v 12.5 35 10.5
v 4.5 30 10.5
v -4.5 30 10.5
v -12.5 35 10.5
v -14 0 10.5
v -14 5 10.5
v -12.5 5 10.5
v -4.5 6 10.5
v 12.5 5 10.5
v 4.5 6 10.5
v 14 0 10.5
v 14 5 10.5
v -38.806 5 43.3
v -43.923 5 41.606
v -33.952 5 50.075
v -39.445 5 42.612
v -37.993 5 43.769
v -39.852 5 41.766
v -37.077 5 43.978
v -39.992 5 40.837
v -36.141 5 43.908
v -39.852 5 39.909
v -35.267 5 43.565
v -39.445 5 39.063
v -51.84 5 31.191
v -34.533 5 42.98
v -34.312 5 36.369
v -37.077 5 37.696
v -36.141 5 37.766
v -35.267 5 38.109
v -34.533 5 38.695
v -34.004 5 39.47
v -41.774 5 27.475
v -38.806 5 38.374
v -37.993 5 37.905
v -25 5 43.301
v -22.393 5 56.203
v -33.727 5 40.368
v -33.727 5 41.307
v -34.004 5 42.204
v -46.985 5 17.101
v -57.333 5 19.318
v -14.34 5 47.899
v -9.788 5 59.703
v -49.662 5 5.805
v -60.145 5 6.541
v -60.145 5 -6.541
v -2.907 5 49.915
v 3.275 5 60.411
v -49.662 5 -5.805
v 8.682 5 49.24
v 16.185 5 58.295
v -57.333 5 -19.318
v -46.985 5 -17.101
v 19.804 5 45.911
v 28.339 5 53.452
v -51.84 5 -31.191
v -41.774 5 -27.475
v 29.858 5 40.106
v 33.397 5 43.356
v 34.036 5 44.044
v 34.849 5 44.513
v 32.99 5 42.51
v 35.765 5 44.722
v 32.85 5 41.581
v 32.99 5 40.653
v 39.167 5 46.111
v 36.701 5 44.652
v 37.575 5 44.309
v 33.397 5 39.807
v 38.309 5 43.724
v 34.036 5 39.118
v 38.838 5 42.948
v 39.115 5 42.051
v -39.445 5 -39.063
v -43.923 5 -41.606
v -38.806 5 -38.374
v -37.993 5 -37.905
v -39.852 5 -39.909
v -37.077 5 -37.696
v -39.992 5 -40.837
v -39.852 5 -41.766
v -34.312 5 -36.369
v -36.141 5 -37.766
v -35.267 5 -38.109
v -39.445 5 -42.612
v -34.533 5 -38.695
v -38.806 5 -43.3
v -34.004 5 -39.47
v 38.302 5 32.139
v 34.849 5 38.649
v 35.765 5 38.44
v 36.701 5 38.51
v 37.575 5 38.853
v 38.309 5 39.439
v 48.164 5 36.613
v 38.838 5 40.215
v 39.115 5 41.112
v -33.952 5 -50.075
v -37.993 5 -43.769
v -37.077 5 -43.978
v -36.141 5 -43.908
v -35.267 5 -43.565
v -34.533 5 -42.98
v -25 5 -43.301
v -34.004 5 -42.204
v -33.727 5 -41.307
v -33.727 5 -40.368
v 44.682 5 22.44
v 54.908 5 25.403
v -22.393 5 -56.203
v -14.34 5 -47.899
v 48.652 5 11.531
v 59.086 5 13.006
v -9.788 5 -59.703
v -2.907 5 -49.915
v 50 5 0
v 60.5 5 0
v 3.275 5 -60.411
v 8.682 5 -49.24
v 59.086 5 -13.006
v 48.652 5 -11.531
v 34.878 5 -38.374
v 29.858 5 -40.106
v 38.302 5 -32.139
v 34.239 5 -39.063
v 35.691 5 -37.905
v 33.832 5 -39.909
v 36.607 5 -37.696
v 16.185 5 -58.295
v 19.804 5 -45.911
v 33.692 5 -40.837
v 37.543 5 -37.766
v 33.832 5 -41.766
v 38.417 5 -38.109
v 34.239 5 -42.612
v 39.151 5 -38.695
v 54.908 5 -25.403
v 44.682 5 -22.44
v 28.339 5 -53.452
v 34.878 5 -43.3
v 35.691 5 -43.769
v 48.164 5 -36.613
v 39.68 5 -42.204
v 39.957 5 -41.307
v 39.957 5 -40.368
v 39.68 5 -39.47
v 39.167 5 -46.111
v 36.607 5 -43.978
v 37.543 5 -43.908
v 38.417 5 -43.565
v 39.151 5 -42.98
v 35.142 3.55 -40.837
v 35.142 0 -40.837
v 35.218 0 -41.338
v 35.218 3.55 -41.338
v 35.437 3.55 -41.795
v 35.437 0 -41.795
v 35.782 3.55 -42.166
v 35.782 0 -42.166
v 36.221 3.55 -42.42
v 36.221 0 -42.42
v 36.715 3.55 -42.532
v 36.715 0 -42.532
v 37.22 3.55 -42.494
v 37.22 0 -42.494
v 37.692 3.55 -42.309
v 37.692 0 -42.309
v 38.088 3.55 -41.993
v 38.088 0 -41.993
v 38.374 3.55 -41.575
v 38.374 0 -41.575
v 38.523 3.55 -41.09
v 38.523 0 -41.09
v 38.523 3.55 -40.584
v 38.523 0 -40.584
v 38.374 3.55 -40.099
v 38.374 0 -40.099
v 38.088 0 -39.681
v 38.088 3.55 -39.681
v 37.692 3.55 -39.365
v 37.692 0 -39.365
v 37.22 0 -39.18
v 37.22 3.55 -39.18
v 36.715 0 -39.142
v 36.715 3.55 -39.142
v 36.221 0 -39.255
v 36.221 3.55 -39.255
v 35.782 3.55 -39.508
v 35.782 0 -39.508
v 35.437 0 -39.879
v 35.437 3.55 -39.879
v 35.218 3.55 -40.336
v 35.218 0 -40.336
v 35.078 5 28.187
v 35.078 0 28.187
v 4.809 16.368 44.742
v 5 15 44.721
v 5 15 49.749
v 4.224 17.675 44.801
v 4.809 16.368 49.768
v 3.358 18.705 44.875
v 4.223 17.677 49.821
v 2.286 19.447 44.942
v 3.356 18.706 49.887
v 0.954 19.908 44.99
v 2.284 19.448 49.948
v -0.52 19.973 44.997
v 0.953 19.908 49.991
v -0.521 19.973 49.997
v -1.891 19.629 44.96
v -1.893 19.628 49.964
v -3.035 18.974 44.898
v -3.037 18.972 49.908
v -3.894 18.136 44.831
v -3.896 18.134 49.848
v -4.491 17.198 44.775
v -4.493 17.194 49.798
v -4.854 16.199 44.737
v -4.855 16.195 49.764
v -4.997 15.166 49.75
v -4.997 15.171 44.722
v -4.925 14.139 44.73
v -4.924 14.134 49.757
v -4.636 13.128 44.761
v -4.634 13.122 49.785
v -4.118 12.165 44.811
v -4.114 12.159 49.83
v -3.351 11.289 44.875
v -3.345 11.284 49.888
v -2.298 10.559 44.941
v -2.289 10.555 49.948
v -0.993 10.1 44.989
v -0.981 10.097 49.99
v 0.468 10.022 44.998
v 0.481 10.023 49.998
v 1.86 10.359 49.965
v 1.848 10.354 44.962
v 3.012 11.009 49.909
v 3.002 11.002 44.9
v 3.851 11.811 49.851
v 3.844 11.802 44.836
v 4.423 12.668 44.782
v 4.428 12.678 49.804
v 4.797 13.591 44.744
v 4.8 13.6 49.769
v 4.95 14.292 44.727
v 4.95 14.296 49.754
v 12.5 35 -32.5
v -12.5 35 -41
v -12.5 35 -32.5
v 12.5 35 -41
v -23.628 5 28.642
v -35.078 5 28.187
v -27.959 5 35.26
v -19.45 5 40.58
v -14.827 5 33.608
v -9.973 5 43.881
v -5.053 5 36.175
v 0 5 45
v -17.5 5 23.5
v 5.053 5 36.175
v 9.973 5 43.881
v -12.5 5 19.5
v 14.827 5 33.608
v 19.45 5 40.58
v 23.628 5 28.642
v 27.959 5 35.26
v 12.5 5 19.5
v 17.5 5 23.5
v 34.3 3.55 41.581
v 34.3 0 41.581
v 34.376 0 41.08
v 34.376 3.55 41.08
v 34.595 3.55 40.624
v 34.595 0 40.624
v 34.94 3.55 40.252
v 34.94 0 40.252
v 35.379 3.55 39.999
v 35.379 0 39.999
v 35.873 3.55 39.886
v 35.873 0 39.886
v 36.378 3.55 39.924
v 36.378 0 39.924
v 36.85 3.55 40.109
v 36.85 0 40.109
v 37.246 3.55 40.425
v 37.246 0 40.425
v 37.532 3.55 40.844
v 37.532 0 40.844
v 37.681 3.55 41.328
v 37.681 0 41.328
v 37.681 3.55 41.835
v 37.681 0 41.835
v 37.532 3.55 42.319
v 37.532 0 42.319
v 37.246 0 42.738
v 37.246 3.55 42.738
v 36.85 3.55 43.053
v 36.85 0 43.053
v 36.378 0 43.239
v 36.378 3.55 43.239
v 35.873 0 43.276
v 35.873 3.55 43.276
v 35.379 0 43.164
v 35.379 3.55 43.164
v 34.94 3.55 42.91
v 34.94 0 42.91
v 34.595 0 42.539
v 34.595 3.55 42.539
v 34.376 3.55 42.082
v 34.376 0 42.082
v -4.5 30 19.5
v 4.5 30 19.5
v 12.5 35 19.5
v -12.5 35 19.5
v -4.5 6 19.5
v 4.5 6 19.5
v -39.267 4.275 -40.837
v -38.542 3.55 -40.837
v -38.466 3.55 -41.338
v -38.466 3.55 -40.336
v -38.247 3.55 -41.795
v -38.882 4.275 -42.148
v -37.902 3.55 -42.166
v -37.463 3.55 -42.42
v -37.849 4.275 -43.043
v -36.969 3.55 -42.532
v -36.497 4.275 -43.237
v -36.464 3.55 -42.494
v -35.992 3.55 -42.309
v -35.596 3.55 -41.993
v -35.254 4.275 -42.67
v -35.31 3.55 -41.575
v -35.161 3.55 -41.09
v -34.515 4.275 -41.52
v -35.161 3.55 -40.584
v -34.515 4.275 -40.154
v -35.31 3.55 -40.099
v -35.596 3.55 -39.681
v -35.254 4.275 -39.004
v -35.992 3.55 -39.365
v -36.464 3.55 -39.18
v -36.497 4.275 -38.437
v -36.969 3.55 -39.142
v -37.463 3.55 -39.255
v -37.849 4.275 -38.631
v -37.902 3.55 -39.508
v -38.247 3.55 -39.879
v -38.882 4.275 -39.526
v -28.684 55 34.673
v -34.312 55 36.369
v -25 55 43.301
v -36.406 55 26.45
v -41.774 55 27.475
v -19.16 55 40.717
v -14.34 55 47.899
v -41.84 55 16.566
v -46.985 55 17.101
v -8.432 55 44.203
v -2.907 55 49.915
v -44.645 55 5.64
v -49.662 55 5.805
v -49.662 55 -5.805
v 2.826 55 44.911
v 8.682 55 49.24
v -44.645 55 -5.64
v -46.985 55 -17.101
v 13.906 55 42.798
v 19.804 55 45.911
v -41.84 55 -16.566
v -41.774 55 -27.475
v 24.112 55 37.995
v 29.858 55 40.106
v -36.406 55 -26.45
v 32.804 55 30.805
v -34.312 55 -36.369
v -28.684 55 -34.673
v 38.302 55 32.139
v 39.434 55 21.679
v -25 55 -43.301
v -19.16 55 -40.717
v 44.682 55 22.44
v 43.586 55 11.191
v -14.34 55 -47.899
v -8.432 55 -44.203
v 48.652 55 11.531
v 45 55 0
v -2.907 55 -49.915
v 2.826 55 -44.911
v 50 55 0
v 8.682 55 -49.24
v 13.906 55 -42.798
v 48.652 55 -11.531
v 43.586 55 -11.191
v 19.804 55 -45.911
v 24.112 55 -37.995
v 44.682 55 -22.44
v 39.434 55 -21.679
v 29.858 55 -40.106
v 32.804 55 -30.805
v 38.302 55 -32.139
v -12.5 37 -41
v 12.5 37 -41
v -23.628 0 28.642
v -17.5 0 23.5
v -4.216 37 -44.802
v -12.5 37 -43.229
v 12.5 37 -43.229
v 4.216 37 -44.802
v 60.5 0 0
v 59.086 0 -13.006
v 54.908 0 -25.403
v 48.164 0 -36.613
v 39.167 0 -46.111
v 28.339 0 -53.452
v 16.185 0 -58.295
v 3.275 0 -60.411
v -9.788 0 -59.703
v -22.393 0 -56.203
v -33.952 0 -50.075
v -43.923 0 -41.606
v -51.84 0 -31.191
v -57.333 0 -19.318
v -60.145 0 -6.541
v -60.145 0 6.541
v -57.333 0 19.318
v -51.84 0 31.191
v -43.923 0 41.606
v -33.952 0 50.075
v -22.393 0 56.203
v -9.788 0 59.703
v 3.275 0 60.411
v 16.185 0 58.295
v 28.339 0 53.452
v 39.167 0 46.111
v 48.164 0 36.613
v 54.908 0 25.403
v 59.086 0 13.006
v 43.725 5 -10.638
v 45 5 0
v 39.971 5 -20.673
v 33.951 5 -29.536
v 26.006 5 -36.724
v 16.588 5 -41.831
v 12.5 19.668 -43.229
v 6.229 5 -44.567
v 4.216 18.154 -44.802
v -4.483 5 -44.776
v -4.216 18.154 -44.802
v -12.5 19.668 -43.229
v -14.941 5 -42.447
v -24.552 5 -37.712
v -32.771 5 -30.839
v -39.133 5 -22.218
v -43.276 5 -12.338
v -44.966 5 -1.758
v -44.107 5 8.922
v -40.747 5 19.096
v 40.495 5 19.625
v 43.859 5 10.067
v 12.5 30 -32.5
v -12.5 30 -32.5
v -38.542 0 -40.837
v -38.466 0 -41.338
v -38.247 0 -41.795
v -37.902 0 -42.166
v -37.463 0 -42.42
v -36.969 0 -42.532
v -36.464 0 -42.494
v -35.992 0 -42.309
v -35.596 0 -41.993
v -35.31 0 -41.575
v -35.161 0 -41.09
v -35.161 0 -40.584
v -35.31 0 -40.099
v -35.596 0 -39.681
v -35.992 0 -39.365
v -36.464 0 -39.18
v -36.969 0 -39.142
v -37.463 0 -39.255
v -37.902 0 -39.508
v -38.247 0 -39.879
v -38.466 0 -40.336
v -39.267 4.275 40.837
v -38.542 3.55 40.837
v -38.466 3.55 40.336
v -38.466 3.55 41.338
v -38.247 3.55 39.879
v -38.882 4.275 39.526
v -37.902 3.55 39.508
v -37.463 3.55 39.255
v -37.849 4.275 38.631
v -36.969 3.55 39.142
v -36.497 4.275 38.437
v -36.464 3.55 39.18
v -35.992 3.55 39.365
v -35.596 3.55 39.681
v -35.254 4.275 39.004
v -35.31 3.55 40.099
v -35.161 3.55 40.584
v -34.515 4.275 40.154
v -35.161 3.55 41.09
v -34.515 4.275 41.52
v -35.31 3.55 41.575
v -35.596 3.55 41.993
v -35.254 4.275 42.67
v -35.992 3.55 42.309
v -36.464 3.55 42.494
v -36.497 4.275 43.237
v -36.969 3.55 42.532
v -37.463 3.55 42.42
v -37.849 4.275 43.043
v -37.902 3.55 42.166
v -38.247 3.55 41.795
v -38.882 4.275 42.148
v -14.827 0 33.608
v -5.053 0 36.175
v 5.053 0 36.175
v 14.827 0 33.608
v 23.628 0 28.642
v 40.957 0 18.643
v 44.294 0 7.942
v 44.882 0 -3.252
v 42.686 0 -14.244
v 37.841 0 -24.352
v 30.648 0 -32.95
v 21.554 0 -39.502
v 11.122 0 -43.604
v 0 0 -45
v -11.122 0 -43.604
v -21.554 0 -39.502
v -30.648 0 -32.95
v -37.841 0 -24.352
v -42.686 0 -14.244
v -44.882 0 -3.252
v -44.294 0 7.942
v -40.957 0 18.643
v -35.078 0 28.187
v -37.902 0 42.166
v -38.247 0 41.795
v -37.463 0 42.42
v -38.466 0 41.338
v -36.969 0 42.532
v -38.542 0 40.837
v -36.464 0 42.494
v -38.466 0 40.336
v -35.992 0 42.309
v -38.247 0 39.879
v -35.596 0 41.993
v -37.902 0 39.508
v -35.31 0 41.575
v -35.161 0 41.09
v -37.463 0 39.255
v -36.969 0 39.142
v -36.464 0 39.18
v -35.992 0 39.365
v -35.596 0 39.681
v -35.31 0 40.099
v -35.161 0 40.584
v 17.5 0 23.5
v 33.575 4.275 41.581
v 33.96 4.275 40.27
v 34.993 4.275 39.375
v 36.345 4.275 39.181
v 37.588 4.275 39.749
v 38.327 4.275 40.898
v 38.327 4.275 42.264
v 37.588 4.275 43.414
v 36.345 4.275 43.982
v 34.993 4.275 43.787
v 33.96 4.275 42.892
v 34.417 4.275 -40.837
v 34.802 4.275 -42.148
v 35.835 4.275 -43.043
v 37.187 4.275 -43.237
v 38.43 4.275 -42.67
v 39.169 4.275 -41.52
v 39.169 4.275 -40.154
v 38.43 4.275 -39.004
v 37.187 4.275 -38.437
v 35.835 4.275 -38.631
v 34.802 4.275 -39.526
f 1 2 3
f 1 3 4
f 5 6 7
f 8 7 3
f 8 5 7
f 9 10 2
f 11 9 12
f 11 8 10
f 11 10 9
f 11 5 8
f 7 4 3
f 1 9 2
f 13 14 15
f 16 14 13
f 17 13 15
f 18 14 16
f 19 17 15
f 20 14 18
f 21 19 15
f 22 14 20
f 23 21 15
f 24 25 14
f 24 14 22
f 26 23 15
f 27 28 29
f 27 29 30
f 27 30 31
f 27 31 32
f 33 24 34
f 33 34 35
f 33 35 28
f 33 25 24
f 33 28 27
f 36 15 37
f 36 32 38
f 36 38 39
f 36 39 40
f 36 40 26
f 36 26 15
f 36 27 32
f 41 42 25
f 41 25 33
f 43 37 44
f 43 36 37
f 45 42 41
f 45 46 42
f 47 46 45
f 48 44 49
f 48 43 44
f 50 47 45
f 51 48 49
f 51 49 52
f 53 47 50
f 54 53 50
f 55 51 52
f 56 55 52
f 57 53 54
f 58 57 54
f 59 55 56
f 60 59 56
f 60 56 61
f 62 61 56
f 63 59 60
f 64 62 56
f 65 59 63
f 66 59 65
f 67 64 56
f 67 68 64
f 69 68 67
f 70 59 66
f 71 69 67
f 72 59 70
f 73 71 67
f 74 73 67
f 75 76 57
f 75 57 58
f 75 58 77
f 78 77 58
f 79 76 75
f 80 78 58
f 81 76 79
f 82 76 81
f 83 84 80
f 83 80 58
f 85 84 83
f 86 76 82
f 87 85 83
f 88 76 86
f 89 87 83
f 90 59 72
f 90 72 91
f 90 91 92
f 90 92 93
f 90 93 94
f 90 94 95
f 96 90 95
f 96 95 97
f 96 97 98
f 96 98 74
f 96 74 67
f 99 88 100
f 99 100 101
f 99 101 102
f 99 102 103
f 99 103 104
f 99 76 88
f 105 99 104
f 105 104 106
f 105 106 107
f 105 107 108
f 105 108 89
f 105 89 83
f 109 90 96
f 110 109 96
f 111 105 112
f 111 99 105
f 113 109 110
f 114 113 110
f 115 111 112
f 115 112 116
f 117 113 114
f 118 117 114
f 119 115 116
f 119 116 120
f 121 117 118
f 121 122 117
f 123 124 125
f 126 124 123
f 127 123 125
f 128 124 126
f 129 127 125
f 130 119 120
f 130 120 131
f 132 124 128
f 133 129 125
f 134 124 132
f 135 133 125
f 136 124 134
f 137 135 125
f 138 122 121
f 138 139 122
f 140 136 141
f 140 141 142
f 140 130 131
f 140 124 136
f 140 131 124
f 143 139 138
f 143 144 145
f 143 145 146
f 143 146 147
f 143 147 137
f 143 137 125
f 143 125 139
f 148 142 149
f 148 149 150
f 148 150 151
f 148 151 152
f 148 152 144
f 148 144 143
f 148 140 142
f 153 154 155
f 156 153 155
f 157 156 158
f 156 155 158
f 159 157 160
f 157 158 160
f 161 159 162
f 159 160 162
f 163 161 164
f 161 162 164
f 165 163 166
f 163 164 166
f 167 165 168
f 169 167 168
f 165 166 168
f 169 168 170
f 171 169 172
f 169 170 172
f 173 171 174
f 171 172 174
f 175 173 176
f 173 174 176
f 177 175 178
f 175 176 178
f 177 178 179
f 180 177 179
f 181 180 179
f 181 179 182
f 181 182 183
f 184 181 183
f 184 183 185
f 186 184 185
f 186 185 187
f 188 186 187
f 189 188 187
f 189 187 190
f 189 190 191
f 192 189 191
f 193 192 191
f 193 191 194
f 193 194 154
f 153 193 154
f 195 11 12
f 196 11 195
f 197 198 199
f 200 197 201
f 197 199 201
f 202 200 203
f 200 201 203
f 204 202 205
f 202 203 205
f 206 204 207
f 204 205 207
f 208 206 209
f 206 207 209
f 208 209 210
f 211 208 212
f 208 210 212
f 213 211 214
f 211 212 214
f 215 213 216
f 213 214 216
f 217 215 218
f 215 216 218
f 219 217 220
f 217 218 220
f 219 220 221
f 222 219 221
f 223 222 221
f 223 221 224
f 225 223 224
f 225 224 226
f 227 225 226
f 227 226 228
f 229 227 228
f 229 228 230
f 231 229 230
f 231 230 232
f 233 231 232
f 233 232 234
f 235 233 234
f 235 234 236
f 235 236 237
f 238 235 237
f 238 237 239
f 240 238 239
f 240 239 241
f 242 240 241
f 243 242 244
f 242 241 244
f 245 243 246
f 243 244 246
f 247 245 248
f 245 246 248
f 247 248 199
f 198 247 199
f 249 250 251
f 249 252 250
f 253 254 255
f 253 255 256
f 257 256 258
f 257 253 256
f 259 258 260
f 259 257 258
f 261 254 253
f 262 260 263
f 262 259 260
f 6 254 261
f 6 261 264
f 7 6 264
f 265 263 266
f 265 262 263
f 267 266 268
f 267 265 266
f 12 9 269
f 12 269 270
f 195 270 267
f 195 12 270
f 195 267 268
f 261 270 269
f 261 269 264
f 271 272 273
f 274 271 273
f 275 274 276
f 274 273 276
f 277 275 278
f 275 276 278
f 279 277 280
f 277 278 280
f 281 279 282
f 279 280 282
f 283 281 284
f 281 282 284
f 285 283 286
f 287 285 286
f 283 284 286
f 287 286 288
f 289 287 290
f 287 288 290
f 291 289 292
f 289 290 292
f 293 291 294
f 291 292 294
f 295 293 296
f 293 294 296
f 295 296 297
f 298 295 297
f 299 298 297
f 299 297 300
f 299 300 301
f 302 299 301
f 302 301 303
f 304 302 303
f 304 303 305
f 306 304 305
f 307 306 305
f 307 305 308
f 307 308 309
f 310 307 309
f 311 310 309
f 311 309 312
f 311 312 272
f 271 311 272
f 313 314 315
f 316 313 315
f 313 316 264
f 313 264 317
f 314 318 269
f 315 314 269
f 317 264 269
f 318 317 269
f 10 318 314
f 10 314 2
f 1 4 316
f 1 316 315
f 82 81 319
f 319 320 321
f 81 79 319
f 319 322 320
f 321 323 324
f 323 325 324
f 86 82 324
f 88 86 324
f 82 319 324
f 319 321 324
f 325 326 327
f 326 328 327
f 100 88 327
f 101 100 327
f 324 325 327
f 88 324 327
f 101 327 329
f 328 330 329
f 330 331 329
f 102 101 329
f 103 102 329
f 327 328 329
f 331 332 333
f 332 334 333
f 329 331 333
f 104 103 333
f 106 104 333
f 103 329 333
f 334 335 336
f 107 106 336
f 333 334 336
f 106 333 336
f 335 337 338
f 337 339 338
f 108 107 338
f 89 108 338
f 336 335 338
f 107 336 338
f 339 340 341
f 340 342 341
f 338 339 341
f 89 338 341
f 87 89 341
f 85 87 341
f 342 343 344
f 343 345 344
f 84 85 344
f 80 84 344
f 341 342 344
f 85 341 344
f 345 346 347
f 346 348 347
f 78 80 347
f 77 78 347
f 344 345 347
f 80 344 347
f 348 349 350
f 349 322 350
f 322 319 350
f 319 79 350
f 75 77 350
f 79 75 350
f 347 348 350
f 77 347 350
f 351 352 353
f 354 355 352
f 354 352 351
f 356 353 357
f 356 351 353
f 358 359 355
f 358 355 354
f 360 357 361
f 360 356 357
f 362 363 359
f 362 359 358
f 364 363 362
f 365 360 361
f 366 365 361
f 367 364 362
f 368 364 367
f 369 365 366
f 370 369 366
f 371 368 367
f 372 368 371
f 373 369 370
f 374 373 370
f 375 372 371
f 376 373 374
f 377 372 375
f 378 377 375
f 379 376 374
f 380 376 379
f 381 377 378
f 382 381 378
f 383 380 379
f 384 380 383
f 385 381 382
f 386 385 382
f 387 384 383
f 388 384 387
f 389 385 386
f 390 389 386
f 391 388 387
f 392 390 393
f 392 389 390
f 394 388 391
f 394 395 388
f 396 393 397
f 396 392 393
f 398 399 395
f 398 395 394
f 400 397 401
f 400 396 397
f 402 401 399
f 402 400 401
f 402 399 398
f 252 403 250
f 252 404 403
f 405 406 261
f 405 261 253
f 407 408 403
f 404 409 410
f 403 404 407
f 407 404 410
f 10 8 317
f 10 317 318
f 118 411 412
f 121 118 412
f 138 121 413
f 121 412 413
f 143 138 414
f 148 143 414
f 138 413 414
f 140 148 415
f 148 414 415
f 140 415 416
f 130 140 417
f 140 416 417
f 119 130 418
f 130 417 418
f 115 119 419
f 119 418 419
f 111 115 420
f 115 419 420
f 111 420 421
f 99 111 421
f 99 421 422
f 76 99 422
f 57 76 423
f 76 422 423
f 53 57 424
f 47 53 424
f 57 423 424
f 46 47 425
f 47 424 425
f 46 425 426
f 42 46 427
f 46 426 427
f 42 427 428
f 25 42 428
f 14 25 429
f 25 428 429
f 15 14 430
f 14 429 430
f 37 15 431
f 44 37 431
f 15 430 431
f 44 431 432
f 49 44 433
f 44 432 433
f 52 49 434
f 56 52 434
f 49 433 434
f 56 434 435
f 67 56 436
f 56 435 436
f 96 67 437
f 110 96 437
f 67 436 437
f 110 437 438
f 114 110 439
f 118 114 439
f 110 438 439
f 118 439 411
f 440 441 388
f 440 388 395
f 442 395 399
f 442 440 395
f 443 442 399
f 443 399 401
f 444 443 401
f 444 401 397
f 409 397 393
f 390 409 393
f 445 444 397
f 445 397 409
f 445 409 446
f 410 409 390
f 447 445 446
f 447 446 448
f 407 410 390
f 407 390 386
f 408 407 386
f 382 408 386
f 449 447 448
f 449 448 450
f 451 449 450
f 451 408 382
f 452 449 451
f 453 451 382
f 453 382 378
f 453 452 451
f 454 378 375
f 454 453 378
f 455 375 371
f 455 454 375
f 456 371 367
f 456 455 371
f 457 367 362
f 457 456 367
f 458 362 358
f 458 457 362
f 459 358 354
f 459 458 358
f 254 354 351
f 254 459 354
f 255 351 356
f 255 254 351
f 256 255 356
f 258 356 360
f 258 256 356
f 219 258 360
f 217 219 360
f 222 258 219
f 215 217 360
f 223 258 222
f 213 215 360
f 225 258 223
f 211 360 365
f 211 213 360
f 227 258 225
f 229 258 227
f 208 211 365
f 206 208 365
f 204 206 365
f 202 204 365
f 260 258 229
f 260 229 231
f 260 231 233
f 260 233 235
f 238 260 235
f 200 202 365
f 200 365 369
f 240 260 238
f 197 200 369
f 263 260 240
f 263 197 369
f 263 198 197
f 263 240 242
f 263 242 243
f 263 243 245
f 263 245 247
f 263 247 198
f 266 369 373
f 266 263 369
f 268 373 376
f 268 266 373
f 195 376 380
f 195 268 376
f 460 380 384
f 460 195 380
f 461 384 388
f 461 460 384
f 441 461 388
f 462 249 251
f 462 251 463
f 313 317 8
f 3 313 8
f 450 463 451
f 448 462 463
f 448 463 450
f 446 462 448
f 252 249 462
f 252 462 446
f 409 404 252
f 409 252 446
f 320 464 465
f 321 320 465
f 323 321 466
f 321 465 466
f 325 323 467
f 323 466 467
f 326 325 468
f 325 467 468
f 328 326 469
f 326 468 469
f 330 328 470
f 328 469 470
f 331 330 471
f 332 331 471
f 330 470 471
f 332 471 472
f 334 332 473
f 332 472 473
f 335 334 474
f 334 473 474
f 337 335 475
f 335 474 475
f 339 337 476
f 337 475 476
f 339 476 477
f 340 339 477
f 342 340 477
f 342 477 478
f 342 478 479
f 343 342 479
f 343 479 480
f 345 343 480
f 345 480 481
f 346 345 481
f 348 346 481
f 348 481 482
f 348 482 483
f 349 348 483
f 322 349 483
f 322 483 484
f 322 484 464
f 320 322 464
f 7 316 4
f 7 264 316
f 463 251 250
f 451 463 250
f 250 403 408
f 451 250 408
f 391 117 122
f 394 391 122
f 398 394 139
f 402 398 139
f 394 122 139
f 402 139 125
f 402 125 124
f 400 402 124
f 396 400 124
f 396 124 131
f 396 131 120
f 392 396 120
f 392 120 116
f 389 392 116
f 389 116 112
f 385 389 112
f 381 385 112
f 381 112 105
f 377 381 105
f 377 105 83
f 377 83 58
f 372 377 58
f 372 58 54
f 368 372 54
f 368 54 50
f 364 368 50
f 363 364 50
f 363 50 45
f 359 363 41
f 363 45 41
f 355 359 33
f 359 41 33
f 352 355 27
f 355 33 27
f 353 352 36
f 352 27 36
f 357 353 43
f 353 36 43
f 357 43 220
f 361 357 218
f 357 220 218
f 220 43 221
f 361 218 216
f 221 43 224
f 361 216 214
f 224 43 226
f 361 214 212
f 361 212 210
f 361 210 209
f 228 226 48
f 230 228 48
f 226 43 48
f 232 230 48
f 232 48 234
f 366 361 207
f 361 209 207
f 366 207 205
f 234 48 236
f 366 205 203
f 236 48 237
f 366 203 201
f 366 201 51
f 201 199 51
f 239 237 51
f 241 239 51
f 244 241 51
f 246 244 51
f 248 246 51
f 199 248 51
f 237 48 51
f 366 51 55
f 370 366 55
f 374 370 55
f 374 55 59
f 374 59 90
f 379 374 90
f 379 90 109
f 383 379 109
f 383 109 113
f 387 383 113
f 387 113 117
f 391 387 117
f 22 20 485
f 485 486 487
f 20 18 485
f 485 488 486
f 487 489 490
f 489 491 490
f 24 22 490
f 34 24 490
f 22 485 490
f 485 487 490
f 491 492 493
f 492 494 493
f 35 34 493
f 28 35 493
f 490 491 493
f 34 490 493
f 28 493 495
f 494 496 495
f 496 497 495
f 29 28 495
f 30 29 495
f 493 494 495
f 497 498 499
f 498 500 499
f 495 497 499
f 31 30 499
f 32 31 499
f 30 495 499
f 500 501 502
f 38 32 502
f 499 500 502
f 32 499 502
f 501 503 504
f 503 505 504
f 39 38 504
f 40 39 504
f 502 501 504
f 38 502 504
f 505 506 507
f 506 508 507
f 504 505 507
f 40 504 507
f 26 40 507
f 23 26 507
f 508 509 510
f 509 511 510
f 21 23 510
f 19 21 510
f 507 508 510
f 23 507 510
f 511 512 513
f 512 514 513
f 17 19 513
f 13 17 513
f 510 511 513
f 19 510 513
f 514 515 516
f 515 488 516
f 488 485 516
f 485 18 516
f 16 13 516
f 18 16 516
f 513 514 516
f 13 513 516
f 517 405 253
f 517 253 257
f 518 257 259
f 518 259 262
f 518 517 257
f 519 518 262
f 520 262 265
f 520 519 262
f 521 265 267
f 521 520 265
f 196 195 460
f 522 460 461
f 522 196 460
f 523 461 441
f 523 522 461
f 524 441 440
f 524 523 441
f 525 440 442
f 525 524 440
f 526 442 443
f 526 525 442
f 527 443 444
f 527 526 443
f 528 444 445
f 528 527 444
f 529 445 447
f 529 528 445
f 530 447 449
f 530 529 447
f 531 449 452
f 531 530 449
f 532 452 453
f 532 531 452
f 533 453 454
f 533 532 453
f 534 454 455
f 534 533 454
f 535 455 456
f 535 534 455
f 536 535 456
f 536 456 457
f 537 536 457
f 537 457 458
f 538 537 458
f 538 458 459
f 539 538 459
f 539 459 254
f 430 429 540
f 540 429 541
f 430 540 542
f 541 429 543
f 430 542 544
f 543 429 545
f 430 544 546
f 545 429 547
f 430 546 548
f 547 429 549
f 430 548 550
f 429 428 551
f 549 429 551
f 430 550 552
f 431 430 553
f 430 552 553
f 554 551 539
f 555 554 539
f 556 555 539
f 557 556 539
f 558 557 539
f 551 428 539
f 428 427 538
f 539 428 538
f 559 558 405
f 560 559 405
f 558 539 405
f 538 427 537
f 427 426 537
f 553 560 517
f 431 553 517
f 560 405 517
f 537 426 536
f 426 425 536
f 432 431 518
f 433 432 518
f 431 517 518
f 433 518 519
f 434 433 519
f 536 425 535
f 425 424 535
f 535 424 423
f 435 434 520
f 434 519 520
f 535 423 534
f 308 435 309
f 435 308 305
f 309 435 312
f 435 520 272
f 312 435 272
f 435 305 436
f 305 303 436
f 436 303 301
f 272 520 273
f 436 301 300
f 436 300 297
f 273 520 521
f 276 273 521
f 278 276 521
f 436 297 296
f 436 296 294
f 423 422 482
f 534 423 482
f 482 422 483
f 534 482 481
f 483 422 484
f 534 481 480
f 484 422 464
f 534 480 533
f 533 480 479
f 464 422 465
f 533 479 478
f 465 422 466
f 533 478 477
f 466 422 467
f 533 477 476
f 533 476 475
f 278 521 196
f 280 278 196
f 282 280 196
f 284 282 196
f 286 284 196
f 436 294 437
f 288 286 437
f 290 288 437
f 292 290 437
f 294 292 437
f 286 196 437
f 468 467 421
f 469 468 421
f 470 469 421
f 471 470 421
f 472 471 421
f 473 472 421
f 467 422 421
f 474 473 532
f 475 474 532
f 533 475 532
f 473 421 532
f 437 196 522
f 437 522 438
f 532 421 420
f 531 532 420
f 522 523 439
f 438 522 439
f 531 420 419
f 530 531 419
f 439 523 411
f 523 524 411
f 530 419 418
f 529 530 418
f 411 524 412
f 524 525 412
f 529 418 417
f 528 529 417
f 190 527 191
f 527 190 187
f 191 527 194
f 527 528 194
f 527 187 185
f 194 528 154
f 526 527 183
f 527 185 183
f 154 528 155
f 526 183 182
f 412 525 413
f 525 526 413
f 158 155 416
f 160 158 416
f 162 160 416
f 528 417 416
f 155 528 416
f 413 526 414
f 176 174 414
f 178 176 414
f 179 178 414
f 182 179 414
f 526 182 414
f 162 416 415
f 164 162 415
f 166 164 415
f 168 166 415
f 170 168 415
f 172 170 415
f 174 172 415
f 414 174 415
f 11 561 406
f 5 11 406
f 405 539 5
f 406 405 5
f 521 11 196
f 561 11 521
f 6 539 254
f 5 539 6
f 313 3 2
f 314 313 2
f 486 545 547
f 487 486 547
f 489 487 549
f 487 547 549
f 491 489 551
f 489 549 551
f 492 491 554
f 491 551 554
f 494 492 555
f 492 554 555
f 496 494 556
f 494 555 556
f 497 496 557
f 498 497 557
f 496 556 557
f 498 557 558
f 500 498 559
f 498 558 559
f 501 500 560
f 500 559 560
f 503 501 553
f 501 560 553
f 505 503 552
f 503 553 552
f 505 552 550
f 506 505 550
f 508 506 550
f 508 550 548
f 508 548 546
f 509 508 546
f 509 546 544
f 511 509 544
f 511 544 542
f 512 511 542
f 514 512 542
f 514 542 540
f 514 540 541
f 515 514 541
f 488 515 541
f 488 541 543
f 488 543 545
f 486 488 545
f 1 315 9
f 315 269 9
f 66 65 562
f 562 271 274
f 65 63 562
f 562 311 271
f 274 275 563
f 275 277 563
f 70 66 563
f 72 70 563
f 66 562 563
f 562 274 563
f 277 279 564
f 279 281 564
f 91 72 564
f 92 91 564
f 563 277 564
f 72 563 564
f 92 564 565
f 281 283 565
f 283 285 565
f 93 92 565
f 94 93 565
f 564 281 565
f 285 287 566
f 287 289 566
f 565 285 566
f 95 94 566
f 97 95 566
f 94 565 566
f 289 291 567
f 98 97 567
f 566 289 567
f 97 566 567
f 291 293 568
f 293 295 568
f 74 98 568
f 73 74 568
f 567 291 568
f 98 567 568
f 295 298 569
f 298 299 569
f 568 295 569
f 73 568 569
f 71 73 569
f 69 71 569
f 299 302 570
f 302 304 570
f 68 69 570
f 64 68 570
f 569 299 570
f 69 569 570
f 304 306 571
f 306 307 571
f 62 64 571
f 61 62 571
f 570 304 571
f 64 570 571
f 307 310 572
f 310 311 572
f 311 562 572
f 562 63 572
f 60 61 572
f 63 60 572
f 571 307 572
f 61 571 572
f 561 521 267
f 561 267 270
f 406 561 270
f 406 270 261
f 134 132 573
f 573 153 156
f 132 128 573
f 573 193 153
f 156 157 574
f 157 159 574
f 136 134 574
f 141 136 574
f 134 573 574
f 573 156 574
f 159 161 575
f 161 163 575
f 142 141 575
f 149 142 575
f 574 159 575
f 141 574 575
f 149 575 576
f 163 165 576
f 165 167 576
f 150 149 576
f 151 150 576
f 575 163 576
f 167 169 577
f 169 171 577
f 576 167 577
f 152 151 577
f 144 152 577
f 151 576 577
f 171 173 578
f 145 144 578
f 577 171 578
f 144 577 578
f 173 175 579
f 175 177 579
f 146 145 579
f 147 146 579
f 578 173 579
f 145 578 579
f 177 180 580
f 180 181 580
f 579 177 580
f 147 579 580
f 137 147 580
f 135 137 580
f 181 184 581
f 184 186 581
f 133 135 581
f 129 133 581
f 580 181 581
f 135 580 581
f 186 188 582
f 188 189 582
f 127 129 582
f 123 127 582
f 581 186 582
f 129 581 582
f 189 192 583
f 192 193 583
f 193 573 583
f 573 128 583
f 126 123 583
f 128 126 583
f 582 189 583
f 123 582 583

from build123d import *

# Parameters (mm, degrees)
SKETCH1_R                                       = 60.5
BOSS_EXTRUDE1_DEPTH                             = 5
SKETCH2_R                                       = 50
SKETCH2_R_2                                     = 45
BOSS_EXTRUDE2_DEPTH                             = 50
SKETCH3_W                                       = 9
SKETCH3_H                                       = 9
BOSS_EXTRUDE3_DEPTH                             = 1
SKETCH3_3_W                                     = 8
SKETCH3_3_H                                     = 9
BOSS_EXTRUDE4_DEPTH                             = 25
SKETCH4_W                                       = 25
SKETCH4_H                                       = 9
BOSS_EXTRUDE5_DEPTH                             = 5
BOSS_EXTRUDE7_DEPTH                             = 12.5
CSK_FOR_M3_FLAT_HEAD_MACHINE_SCREW1_D           = 3.4
CSK_FOR_M3_FLAT_HEAD_MACHINE_SCREW1_DEPTH       = 5
CSK_FOR_M3_FLAT_HEAD_MACHINE_SCREW1_CSINK_D     = 6.3
CSK_FOR_M3_FLAT_HEAD_MACHINE_SCREW1_CSINK_ANGLE = 90
CUT_EXTRUDE1_REACH                              = 132
SKETCH10_R                                      = 5


with BuildPart() as part:
    # Sketch1 → Boss-Extrude1 (new body)
    with BuildSketch(Plane(origin=(0, 0, 0), x_dir=(1, 0, 0), z_dir=(0, 1, 0))):
        Circle(SKETCH1_R)
        with BuildLine():
            Line((-14, -10.5), (14, -10.5))
            Line((14, -10.5), (35.078449216, -28.186918963))
            ThreePointArc((35.078449216, -28.186918963), (0, 45), (-35.078449216, -28.186918963))
            Line((-35.078449216, -28.186918963), (-14, -10.5))
        make_face(mode=Mode.SUBTRACT)
        with BuildLine():
            Line((-17.5, -23.5), (-23.628355545, -28.642300877))
            ThreePointArc((-23.628355545, -28.642300877), (0, -36.5), (23.628355545, -28.642300877))
            Line((23.628355545, -28.642300877), (17.5, -23.5))
            Line((17.5, -23.5), (-17.5, -23.5))
        make_face(mode=Mode.SUBTRACT)
    extrude(amount=BOSS_EXTRUDE1_DEPTH)

    # Sketch2 → Boss-Extrude2 (add)
    with BuildSketch(Plane(origin=(0, 5, 0), x_dir=(1, 0, 0), z_dir=(0, 1, 0))):
        Circle(SKETCH2_R)
        Circle(SKETCH2_R_2, mode=Mode.SUBTRACT)
    extrude(amount=BOSS_EXTRUDE2_DEPTH)

    # Sketch3 → Boss-Extrude3 (add)
    with BuildSketch(Plane(origin=(0, 5, 0), x_dir=(1, 0, 0), z_dir=(0, 1, 0))):
        with Locations((0, -15)):
            Rectangle(SKETCH3_W, SKETCH3_H)
    extrude(amount=BOSS_EXTRUDE3_DEPTH)

    # Sketch3<3> → Boss-Extrude4 (add)
    with BuildSketch(Plane(origin=(0, 5, 0), x_dir=(1, 0, 0), z_dir=(0, 1, 0))):
        with Locations((-8.5, -15)):
            Rectangle(SKETCH3_3_W, SKETCH3_3_H)
        with Locations((8.5, -15)):
            Rectangle(SKETCH3_3_W, SKETCH3_3_H)
    extrude(amount=BOSS_EXTRUDE4_DEPTH)

    # Sketch4 → Boss-Extrude5 (add)
    with BuildSketch(Plane(origin=(0, 30, 0), x_dir=(1, 0, 0), z_dir=(0, 1, 0))):
        with Locations((0, -15)):
            Rectangle(SKETCH4_W, SKETCH4_H)
    extrude(amount=BOSS_EXTRUDE5_DEPTH)

    # Sketch5 → Boss-Extrude7 (add, symmetric)
    with BuildSketch(Plane(origin=(0, 0, 0), x_dir=(0, 0, -1), z_dir=(1, 0, 0))):
        Polygon((41, 35), (32.5, 35), (32.5, 30), (46, 17), (46, 37), (41, 37), align=None)
    extrude(amount=BOSS_EXTRUDE7_DEPTH, both=True)

    # CSK for M3 Flat Head Machine Screw1
    with Locations(Plane(origin=(0, 5, 0), x_dir=(1, 0, 0), z_dir=(0, 1, 0))):
        with Locations((-36.842001616, 40.837077723), (36.842001616, 40.837077723), (36, -41.581245773), (-36.842001616, -40.837077723)):
            CounterSinkHole(CSK_FOR_M3_FLAT_HEAD_MACHINE_SCREW1_D / 2, CSK_FOR_M3_FLAT_HEAD_MACHINE_SCREW1_CSINK_D / 2, depth=CSK_FOR_M3_FLAT_HEAD_MACHINE_SCREW1_DEPTH, counter_sink_angle=CSK_FOR_M3_FLAT_HEAD_MACHINE_SCREW1_CSINK_ANGLE)

    # Sketch10 → Cut-Extrude1 (cut, up to next)
    with BuildSketch(Plane.XY.offset(69.5), mode=Mode.PRIVATE) as cut_extrude1_sk1:
        with Locations((0, 15)):
            Circle(SKETCH10_R)
    cut_extrude1_tool1 = extrude(cut_extrude1_sk1.sketch, amount=-CUT_EXTRUDE1_REACH, mode=Mode.PRIVATE) & part.part
    add(cut_extrude1_tool1.solids().sort_by_distance((0, 15, 69.5))[0], mode=Mode.SUBTRACT)


solid = part.part
